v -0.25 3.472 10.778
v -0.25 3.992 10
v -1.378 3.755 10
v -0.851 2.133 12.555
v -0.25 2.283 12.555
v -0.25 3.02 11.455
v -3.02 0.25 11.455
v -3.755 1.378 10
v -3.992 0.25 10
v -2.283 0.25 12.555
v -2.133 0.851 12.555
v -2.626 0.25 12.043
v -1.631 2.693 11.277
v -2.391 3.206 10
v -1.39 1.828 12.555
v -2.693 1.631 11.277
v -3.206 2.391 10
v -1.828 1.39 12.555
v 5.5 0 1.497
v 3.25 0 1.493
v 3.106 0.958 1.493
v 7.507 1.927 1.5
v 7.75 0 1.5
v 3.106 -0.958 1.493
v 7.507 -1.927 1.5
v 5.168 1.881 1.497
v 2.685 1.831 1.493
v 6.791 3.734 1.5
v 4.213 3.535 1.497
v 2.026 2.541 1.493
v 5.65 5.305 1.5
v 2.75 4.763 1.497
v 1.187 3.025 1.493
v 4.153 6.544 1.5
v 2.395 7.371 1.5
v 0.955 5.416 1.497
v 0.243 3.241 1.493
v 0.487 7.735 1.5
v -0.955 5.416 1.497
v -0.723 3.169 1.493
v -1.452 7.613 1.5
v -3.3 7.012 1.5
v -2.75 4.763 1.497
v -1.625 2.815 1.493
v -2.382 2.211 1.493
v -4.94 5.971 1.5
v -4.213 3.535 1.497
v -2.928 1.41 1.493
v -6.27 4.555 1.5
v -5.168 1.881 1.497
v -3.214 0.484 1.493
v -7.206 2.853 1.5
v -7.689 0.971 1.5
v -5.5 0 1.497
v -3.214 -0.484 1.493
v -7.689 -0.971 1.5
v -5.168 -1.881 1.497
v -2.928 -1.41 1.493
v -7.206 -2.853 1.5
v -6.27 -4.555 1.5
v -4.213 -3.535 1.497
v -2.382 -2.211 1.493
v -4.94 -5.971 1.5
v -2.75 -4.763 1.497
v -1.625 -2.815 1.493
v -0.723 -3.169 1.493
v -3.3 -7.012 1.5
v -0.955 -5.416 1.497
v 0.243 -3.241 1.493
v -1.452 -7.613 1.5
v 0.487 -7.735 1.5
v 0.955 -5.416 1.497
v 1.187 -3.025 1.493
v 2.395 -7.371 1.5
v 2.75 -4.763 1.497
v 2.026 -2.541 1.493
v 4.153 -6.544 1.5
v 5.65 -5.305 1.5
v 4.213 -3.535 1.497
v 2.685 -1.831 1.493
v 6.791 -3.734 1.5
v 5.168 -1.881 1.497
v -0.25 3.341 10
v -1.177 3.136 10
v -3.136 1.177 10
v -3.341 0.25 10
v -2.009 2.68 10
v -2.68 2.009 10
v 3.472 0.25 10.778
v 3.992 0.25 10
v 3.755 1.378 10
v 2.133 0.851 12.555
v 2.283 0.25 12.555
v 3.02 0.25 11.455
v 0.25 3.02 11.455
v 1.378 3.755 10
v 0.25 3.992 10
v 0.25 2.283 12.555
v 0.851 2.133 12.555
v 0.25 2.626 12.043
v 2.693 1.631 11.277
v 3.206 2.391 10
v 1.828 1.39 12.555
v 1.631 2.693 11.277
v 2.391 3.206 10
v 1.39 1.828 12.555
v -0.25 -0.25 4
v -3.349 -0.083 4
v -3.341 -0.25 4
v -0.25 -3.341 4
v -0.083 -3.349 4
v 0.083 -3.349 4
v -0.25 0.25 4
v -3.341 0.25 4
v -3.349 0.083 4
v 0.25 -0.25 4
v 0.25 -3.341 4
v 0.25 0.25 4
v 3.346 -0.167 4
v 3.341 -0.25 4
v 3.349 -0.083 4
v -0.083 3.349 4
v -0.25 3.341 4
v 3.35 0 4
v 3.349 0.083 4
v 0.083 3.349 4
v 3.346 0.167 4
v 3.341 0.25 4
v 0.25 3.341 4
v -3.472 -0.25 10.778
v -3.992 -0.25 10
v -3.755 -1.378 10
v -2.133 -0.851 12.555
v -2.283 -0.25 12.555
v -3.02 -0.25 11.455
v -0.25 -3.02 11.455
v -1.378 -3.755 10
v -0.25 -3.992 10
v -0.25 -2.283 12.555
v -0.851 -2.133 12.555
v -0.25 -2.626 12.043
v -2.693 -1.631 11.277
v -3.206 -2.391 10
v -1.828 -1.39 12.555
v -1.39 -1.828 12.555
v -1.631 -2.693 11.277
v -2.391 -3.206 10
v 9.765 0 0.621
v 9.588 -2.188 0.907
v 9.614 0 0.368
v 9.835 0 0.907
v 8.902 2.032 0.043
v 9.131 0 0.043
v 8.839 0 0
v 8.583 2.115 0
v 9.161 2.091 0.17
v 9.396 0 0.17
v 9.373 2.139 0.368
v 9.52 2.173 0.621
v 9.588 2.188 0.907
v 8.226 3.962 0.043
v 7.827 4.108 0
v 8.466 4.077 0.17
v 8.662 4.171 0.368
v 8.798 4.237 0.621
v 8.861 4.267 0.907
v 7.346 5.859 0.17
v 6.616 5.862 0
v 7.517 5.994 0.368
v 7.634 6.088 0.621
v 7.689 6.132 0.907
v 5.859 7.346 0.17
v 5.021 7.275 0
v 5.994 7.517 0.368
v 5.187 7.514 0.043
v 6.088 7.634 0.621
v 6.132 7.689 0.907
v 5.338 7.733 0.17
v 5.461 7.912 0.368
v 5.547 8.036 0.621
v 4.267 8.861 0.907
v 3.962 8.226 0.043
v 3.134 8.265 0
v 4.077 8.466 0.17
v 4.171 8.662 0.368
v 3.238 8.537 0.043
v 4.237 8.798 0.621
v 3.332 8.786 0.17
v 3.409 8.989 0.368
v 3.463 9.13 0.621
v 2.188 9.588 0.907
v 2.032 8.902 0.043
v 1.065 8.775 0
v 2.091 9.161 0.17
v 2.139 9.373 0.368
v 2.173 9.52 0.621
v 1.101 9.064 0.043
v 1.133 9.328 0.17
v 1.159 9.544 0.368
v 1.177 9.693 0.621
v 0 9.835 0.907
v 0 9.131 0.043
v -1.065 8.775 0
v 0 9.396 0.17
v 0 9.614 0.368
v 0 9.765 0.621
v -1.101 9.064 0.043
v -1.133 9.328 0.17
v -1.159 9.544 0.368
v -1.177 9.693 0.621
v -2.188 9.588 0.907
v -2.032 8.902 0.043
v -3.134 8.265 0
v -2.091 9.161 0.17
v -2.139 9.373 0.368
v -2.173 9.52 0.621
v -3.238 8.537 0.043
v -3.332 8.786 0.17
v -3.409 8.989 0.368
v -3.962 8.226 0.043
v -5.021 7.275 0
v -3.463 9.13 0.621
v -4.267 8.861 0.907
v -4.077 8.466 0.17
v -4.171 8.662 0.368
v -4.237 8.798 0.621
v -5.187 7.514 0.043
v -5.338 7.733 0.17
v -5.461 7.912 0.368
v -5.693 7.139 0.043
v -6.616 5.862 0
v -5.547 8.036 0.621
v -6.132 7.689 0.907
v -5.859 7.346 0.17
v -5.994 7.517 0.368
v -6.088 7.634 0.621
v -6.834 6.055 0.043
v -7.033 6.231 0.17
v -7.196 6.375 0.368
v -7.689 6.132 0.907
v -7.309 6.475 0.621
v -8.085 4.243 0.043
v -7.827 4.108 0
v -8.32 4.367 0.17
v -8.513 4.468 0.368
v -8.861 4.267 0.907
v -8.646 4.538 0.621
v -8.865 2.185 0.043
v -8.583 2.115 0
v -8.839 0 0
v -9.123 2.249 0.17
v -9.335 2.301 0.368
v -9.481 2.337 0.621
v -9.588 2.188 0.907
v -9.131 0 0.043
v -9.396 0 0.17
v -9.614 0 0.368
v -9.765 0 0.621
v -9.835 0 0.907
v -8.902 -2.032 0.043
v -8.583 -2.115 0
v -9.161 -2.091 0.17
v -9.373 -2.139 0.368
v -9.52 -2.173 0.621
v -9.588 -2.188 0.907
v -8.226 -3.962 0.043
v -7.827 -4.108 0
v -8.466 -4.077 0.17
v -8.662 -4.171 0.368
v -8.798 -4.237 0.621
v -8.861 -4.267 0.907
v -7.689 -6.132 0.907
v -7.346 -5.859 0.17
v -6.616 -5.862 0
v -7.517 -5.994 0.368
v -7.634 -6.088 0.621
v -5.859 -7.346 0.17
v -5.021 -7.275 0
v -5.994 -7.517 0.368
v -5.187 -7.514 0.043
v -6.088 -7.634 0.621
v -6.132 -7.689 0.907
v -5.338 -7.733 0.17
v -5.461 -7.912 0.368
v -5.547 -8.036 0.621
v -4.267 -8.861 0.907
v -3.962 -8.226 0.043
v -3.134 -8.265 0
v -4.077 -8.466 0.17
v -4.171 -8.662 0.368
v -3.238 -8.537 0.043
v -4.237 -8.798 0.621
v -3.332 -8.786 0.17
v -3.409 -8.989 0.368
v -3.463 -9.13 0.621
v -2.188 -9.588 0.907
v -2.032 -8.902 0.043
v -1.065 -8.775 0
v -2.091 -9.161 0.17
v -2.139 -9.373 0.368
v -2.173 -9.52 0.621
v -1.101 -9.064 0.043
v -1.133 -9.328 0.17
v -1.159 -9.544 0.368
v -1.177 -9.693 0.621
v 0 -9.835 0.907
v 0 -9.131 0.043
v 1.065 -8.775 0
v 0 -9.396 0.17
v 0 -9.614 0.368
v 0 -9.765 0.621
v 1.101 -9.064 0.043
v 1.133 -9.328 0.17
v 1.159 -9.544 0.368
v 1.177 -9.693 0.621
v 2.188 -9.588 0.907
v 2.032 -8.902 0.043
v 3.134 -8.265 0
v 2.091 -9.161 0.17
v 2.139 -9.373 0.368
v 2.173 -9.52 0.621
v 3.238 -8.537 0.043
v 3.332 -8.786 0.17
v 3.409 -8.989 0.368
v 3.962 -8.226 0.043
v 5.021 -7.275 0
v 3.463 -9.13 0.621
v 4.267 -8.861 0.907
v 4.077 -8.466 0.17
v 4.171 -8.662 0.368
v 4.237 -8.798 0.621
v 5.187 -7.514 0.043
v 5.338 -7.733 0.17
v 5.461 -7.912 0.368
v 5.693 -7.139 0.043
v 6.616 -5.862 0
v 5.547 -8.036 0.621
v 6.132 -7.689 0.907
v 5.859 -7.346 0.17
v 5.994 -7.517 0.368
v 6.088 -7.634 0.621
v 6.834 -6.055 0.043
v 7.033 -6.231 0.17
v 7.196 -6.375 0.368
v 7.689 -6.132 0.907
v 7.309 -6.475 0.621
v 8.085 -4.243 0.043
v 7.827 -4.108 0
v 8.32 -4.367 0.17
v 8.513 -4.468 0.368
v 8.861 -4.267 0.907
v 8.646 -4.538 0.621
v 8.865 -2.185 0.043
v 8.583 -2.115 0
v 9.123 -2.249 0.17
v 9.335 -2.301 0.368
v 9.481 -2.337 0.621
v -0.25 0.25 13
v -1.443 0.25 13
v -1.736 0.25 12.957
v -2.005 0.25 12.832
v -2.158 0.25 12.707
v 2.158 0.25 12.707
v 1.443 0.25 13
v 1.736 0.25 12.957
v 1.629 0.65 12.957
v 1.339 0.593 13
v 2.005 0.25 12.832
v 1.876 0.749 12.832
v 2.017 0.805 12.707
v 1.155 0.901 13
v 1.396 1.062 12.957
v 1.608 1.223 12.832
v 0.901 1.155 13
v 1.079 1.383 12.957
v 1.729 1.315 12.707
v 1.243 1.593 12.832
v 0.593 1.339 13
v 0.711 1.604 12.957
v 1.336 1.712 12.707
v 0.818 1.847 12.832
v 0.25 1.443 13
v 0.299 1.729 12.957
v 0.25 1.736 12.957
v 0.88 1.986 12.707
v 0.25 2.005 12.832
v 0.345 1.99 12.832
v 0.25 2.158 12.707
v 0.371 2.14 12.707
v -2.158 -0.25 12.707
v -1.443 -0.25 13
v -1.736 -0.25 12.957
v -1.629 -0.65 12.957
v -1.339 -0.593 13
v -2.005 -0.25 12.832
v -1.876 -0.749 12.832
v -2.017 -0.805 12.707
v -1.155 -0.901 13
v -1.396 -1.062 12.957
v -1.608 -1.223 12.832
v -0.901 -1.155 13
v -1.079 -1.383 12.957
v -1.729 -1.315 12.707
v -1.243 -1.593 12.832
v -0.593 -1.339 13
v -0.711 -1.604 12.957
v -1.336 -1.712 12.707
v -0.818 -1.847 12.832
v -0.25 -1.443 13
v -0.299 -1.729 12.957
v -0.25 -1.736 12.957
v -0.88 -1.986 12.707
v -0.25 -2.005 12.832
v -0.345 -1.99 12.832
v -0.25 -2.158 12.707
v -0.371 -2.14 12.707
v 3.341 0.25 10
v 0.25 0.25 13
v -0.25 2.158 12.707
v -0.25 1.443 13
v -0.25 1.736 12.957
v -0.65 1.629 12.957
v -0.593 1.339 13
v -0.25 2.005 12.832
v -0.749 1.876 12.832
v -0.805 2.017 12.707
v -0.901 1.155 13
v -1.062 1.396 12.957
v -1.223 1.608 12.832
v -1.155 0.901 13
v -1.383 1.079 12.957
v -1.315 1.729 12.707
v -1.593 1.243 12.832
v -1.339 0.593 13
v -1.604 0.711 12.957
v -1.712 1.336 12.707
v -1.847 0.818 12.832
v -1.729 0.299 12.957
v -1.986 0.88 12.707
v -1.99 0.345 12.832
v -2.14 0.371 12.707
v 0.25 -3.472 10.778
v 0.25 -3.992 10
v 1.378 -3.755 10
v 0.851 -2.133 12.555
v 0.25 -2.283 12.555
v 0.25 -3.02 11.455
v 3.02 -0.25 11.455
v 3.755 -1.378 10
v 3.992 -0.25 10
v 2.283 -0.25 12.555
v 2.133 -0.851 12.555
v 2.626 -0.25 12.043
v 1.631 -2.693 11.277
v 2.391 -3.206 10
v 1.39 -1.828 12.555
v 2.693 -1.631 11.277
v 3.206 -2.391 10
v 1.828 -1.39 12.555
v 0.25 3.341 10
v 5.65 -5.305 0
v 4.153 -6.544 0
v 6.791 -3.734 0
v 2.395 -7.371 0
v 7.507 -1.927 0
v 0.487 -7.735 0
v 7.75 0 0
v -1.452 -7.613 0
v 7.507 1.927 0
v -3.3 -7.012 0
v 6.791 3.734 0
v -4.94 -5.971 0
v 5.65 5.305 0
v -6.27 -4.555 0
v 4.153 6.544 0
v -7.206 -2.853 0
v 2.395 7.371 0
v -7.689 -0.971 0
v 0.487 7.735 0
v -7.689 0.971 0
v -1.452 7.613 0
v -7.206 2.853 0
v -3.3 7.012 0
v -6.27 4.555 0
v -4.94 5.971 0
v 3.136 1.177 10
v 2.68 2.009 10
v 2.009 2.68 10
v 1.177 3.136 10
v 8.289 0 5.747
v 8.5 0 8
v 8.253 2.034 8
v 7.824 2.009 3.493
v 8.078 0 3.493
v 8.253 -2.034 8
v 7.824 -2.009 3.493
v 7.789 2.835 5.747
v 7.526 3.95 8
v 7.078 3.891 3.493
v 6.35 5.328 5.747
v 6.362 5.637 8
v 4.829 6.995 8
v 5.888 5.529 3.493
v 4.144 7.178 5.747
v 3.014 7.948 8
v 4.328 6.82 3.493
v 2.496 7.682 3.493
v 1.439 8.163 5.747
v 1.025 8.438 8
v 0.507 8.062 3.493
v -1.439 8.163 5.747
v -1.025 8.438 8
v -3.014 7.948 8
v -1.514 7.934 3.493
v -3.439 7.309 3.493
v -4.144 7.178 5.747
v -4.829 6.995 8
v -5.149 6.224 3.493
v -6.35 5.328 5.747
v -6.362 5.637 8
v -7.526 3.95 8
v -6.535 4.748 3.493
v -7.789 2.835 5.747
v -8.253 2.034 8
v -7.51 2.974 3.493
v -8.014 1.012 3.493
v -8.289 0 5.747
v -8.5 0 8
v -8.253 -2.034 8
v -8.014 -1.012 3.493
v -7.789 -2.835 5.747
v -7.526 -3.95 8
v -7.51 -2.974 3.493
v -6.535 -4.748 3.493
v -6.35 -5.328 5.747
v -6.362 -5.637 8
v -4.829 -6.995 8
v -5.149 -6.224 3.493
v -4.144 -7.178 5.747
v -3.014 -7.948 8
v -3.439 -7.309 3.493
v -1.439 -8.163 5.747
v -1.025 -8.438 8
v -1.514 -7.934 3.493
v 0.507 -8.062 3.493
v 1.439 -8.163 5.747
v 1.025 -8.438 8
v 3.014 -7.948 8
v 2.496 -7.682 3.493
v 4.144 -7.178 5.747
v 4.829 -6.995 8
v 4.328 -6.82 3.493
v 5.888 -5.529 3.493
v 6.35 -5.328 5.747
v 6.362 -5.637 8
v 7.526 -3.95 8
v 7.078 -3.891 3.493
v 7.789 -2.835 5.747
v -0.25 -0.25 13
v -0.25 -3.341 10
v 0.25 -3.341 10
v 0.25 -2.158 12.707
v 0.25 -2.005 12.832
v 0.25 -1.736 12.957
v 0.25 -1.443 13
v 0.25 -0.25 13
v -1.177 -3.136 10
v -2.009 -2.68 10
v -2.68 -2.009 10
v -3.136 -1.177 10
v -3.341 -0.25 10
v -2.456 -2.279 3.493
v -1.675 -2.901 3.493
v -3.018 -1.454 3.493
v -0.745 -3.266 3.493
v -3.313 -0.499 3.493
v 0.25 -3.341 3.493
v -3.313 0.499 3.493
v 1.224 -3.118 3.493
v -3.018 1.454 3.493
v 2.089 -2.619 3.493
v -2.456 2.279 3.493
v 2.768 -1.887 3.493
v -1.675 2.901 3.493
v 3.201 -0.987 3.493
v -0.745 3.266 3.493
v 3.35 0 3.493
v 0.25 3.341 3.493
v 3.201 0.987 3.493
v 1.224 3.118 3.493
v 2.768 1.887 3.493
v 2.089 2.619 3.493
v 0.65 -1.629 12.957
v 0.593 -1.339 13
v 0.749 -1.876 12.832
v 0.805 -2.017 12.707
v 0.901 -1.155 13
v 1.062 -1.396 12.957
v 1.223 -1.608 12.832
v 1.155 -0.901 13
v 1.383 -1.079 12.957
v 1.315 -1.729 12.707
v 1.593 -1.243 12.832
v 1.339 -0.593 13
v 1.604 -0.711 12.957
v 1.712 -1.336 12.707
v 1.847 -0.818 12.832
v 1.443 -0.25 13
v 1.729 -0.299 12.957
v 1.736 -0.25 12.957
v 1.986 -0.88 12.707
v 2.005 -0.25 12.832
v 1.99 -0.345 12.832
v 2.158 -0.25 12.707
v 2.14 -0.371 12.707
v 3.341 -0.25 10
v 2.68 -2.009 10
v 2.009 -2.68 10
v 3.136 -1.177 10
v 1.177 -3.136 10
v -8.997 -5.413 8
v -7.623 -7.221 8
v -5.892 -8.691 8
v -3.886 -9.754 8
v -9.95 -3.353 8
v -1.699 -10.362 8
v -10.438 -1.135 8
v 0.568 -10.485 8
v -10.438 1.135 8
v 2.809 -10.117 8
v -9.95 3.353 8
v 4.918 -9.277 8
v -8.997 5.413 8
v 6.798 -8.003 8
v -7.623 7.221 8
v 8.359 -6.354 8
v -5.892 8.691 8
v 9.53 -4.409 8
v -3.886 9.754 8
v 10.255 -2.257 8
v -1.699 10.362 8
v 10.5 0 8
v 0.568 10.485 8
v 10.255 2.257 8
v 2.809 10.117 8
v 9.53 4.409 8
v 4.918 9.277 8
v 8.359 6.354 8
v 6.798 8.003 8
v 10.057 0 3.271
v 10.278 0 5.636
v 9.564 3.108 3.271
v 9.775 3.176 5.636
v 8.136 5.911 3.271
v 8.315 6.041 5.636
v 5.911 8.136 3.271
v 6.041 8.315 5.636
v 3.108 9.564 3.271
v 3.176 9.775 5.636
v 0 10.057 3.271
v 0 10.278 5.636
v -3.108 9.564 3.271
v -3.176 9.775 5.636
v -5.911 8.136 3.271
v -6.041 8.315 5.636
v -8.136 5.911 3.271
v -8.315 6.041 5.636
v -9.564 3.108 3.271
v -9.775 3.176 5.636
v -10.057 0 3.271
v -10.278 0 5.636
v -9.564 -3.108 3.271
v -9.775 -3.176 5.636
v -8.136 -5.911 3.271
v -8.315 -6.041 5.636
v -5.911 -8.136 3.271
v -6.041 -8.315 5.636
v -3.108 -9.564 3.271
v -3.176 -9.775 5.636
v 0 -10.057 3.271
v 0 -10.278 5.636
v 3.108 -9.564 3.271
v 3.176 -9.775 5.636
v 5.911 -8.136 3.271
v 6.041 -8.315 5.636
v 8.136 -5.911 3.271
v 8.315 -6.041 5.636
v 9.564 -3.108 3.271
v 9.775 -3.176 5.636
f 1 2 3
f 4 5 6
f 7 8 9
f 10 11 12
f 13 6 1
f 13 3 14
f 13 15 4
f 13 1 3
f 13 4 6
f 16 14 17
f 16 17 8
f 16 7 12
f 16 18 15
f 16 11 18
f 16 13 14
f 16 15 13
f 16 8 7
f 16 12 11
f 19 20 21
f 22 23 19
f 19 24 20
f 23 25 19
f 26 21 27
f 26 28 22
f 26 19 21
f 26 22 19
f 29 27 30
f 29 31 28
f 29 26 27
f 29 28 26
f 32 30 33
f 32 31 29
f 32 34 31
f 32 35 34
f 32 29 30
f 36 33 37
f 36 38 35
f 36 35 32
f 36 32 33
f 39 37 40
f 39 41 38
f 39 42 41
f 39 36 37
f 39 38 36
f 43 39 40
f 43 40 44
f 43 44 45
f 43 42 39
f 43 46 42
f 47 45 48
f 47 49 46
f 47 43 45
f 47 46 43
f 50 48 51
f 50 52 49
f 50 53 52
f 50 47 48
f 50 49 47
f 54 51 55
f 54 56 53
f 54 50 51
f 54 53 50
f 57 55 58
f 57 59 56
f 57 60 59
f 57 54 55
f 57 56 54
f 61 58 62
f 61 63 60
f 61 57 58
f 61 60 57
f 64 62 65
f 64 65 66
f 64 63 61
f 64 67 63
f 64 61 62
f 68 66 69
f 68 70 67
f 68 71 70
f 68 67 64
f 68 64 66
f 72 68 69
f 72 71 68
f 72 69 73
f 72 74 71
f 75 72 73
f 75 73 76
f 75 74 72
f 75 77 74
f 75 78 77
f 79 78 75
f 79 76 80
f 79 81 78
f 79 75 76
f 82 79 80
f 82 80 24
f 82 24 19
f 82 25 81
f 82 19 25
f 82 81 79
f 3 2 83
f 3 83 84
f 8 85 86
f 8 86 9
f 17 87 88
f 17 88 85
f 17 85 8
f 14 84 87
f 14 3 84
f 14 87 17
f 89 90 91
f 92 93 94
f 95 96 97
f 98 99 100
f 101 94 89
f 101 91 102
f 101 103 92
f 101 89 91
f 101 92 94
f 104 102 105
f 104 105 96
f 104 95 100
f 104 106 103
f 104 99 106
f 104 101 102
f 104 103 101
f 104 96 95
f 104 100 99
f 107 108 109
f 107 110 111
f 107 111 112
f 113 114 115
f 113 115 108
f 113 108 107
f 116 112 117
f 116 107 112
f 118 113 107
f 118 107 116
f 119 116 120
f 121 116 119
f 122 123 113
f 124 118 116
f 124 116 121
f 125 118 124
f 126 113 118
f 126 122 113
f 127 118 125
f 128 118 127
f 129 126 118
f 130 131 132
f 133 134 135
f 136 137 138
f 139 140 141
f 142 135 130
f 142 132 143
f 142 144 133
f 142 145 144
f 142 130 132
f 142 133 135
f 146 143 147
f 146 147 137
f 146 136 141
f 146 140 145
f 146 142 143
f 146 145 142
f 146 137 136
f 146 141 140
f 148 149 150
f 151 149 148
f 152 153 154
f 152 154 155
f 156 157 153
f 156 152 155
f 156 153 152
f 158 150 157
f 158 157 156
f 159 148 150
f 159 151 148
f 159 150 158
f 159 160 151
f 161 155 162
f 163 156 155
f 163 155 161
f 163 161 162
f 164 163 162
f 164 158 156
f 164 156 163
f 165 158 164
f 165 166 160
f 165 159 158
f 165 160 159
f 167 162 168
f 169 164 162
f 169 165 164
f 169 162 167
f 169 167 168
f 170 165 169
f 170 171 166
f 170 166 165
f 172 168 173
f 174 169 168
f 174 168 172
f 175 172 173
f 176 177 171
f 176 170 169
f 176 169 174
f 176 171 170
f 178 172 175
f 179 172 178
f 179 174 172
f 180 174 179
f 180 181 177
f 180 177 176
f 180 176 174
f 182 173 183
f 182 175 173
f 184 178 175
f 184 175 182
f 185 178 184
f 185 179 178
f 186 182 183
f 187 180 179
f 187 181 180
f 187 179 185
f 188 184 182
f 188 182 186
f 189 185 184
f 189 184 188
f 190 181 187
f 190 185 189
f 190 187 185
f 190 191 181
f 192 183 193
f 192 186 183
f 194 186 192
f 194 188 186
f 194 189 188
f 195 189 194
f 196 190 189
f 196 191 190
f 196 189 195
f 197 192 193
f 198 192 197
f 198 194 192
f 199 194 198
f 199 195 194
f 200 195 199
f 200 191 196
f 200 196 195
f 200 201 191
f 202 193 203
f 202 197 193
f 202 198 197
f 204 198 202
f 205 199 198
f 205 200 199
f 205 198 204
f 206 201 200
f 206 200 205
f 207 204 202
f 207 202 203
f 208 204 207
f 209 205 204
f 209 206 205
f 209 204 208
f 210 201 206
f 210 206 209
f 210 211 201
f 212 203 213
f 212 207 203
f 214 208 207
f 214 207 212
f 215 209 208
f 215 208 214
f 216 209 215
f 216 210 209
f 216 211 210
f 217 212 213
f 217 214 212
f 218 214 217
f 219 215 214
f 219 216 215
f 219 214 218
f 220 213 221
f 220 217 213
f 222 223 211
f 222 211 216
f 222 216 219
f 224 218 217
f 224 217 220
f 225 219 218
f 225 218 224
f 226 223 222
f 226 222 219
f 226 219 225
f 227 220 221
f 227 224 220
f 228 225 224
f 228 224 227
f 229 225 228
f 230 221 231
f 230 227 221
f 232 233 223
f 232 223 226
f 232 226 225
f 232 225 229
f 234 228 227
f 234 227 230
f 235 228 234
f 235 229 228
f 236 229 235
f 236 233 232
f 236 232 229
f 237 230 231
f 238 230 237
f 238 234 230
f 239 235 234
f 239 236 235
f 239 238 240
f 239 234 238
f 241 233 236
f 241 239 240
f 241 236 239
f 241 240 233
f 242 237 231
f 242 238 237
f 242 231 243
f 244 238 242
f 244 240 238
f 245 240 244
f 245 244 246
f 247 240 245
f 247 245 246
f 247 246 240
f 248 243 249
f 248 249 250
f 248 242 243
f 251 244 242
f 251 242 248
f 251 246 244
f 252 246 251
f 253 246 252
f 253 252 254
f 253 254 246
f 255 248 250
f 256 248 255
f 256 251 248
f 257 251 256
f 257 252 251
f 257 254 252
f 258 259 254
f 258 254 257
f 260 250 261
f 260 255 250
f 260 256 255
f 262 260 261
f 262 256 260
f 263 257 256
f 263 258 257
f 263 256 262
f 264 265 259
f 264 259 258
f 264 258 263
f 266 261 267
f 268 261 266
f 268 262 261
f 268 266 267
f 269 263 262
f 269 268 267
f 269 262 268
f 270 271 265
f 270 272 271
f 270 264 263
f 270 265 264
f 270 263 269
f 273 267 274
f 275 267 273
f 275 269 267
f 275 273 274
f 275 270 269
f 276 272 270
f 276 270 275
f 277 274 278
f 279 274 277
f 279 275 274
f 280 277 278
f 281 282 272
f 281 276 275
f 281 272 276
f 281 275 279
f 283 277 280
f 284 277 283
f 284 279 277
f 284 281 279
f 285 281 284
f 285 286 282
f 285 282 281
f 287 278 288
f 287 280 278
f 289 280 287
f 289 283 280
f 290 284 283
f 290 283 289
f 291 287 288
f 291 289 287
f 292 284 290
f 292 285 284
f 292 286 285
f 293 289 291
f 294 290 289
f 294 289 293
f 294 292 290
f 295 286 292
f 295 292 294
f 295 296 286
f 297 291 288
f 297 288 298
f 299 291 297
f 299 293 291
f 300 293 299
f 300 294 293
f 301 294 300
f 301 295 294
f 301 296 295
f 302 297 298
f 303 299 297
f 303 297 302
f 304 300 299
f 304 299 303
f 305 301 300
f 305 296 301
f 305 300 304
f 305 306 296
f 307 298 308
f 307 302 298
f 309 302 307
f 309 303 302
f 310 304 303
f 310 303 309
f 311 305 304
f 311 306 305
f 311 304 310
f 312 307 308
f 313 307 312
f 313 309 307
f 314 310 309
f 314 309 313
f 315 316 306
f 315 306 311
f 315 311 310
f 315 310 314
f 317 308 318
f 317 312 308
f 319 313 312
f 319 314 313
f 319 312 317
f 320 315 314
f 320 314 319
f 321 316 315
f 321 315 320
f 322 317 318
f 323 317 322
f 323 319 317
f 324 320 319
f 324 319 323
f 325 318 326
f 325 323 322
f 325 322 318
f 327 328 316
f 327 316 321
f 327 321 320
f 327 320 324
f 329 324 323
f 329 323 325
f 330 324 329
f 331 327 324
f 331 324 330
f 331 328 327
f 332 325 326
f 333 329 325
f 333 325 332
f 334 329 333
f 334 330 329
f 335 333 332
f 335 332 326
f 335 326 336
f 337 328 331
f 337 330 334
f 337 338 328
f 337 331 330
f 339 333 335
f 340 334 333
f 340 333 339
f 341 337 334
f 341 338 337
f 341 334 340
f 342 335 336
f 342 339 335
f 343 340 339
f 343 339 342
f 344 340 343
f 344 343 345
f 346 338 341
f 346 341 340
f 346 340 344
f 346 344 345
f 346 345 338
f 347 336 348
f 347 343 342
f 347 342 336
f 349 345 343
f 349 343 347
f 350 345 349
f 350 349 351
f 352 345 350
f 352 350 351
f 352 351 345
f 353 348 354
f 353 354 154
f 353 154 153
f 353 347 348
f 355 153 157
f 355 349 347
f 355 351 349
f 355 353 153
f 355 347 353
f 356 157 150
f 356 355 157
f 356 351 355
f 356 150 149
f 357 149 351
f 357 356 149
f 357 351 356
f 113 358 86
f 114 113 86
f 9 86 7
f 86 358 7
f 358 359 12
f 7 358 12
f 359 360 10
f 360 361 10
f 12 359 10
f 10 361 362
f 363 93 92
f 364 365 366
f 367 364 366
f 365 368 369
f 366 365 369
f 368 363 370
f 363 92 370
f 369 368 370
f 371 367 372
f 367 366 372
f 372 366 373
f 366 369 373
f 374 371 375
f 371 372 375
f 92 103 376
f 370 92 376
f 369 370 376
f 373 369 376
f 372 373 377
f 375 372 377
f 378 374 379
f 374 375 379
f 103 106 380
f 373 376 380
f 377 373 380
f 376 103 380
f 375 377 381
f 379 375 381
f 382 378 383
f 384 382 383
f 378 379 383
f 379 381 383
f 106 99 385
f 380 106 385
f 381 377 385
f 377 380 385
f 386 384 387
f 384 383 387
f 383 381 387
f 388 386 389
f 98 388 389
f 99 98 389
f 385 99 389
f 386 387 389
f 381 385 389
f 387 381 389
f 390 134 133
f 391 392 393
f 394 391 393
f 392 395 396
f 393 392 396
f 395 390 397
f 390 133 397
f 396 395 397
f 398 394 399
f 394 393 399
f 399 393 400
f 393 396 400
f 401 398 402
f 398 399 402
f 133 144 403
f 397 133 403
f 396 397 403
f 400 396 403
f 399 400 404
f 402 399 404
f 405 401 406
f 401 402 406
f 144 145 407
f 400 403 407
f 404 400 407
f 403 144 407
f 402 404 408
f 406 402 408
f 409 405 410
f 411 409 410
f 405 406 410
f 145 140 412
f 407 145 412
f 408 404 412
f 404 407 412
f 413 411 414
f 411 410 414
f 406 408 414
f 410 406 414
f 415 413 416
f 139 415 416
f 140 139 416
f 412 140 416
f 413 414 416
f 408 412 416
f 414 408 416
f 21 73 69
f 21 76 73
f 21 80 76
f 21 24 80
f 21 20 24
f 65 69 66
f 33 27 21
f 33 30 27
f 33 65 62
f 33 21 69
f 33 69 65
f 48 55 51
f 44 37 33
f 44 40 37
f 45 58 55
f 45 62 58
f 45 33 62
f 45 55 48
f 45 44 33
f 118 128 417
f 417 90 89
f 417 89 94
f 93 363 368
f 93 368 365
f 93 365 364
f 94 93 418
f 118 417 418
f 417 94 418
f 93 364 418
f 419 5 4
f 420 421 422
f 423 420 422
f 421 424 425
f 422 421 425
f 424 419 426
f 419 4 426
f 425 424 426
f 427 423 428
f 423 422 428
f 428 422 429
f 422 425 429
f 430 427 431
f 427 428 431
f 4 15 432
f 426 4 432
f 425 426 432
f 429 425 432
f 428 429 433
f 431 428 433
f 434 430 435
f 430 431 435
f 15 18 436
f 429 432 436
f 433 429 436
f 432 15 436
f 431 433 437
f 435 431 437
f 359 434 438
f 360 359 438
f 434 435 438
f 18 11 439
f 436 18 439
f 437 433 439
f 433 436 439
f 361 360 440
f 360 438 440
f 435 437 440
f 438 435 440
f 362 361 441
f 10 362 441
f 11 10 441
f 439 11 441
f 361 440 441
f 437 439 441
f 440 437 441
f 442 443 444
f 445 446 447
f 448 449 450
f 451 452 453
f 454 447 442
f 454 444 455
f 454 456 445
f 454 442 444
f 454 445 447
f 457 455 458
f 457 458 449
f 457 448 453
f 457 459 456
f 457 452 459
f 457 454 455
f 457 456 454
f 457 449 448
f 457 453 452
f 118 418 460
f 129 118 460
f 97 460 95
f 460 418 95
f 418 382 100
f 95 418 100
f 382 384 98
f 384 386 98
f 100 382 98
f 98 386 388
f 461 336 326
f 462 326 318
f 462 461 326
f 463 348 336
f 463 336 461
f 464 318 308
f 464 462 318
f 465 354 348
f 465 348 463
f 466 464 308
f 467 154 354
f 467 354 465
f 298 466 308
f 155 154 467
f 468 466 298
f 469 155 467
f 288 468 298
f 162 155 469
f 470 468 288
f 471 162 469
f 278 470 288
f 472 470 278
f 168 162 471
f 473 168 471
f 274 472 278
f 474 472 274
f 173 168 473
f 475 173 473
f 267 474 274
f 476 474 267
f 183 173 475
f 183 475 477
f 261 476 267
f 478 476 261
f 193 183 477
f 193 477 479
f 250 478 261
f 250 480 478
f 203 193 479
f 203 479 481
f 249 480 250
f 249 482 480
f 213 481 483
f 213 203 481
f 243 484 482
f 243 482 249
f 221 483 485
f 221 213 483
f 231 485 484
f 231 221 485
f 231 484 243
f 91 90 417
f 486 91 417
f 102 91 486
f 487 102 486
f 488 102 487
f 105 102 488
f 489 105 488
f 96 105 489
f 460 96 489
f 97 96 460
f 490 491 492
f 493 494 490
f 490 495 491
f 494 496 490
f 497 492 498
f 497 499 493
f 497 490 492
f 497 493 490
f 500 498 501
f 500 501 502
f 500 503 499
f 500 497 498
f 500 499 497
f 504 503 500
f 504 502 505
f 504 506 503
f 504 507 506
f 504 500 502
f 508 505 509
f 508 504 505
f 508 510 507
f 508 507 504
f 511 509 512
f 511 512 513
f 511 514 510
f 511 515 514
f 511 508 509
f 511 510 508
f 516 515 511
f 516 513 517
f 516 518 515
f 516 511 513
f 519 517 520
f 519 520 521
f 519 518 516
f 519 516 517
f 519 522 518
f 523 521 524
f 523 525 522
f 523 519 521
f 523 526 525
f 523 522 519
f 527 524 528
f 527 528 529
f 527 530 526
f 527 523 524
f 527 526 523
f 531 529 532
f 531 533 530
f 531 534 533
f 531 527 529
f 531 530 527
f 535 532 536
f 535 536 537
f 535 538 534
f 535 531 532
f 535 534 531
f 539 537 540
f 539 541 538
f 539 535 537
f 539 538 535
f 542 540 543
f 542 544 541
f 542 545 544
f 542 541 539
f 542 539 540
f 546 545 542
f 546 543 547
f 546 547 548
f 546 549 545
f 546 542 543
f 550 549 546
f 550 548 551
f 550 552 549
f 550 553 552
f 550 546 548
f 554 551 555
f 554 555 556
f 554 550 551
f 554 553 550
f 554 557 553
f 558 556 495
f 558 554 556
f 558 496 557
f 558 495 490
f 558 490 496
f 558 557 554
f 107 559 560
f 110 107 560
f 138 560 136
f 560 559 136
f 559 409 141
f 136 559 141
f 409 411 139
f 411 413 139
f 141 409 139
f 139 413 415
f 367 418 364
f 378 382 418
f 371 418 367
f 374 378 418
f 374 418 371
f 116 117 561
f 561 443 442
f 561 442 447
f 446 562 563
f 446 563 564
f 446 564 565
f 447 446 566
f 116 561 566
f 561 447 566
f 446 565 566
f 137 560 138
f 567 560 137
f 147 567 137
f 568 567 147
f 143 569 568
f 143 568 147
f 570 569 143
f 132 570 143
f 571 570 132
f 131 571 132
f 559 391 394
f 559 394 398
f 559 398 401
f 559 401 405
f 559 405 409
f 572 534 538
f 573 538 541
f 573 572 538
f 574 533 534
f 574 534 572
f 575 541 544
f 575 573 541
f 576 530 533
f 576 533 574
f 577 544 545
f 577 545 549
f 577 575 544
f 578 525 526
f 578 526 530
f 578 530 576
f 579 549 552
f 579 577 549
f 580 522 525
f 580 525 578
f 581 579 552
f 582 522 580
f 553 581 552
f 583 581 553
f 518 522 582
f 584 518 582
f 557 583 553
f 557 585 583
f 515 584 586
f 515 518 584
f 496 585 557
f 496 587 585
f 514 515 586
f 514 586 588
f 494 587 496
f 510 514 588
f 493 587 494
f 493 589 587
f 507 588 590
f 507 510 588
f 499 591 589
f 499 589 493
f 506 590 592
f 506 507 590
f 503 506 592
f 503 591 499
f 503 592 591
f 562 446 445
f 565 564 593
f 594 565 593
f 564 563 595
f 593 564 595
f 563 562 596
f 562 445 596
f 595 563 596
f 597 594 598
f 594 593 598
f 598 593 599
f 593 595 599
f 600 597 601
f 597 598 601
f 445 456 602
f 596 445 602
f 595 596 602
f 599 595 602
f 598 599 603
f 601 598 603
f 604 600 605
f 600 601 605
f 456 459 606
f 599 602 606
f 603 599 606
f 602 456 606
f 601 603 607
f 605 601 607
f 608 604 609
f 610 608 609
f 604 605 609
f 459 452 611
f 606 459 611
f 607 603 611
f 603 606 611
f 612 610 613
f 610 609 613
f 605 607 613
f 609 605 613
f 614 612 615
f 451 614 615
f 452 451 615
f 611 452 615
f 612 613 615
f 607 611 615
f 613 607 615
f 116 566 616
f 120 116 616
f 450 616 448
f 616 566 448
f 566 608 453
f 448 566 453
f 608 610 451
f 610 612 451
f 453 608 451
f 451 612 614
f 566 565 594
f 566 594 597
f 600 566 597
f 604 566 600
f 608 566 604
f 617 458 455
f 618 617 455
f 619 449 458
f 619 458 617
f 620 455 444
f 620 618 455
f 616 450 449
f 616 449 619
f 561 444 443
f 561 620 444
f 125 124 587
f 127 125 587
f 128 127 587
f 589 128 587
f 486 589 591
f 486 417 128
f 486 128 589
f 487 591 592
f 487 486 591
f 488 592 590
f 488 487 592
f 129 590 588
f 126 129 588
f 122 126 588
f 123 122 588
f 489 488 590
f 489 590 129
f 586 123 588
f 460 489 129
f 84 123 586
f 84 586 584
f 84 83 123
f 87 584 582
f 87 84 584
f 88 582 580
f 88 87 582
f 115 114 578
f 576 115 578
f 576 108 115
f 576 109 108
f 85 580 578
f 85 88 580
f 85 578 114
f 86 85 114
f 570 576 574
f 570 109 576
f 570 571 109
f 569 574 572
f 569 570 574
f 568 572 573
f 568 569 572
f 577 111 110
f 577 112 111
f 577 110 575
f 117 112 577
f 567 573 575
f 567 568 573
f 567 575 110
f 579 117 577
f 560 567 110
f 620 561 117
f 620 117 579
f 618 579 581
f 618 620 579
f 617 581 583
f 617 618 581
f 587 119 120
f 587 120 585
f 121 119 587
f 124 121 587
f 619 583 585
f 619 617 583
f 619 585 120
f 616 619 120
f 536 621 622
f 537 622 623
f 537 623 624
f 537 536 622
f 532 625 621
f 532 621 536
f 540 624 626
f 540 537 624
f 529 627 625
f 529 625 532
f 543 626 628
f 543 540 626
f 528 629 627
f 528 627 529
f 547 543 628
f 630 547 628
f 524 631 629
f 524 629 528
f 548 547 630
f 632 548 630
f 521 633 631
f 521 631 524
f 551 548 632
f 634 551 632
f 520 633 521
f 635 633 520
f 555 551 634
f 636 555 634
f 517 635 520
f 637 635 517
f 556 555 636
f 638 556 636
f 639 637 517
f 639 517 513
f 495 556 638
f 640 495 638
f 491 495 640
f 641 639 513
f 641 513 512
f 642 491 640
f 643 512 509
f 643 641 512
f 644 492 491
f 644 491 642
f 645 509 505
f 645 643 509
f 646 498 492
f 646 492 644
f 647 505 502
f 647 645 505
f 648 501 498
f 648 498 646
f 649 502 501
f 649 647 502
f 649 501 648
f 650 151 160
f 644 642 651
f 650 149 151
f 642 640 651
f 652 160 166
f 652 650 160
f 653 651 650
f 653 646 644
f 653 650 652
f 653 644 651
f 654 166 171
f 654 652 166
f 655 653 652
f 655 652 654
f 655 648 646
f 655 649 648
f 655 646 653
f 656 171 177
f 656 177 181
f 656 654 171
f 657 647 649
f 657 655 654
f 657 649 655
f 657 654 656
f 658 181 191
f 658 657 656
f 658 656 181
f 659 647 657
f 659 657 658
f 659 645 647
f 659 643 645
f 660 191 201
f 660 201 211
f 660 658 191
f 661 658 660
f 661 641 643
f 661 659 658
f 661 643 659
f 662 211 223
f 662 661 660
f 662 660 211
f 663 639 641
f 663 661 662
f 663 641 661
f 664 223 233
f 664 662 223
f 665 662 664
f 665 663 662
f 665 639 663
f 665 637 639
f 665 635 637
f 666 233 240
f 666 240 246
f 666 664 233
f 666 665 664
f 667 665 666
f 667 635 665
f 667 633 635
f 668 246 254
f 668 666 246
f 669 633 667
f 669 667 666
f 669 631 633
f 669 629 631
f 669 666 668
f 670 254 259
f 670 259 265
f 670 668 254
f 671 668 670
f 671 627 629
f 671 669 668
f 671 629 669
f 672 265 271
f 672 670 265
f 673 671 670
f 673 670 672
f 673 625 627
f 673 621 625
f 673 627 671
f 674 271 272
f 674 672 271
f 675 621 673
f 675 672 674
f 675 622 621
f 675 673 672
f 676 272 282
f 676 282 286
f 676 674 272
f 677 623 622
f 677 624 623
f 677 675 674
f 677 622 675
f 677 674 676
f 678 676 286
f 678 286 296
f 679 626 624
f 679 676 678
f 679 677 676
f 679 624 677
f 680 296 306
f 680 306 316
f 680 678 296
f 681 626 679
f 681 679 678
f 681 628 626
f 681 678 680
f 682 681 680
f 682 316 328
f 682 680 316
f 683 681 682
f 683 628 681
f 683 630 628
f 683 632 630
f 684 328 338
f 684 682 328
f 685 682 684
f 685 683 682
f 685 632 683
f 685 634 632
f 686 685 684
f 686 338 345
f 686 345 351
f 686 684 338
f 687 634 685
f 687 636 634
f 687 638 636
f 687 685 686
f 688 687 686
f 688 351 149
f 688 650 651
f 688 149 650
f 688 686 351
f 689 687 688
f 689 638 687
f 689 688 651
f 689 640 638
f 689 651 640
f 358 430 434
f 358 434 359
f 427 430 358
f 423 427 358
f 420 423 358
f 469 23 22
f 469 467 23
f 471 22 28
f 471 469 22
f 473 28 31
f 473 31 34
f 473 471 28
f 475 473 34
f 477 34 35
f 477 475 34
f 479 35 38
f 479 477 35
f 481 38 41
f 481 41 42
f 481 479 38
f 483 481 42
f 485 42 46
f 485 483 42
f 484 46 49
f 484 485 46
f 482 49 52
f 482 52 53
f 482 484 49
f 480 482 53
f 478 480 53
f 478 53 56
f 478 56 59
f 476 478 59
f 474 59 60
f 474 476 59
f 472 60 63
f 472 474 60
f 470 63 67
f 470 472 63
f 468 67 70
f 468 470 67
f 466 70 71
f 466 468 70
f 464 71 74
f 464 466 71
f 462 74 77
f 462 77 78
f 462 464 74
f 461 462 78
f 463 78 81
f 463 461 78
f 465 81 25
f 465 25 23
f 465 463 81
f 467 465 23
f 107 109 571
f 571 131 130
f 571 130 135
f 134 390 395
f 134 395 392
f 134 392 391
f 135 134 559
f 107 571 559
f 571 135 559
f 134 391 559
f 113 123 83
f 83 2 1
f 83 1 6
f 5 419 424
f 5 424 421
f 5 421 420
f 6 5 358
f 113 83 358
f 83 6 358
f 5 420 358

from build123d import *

# Parameters (mm, degrees)
F2_W     = 0.5
F2_H     = 0.5
F3_DEPTH = 9
F4_R     = 1
F5_R     = 1


with BuildPart() as f1:
    # F0 (on Front) → F1 (revolve)
    with BuildSketch(Plane.XZ):
        Polygon((7.75, 0), (9.75, 0), (10.5, 8), (8.5, 8), (8.0775014419, 3.4933487132), (3.35, 3.4933487132), (3.35, 10), (4, 10), (2, 13), (0, 13), (0, 8), (0, 1.4933487132), (3.25, 1.4933487132), (7.75, 1.5), align=None)
    revolve(axis=Axis((0, 0, 4), (0, 0, 1)))

    # F2 (on face) → F3 (cut)
    with BuildSketch(Plane.XY.offset(13)):
        with BuildLine():
            ThreePointArc((-1.9843134833, -0.25), (-2, 0), (-1.9843134833, 0.25))
            Line((-1.9843134833, 0.25), (-4, 0.25))
            Line((-4, 0.25), (-4, -0.25))
            Line((-4, -0.25), (-1.9843134833, -0.25))
        make_face()
        with BuildLine():
            Line((-0.25, -0.25), (-0.25, 0.25))
            Line((-0.25, 0.25), (-1.9843134833, 0.25))
            ThreePointArc((-1.9843134833, 0.25), (-2, 0), (-1.9843134833, -0.25))
            Line((-1.9843134833, -0.25), (-0.25, -0.25))
        make_face()
        Rectangle(F2_W, F2_H)
        with BuildLine():
            Line((1.9843134833, 0.25), (0.25, 0.25))
            Line((0.25, 0.25), (0.25, -0.25))
            Line((0.25, -0.25), (1.9843134833, -0.25))
            ThreePointArc((1.9843134833, -0.25), (1.9960745185, -0.1252458251), (2, 0))
            ThreePointArc((2, 0), (1.9960745185, 0.1252458251), (1.9843134833, 0.25))
        make_face()
        with BuildLine():
            Line((4, 0.25), (1.9843134833, 0.25))
            ThreePointArc((1.9843134833, 0.25), (1.9960745185, 0.1252458251), (2, 0))
            ThreePointArc((2, 0), (1.9960745185, -0.1252458251), (1.9843134833, -0.25))
            Line((1.9843134833, -0.25), (4, -0.25))
            Line((4, -0.25), (4, 0.25))
        make_face()
        with BuildLine():
            Line((0.25, 1.9843134833), (0.25, 4))
            Line((0.25, 4), (-0.25, 4))
            Line((-0.25, 4), (-0.25, 1.9843134833))
            ThreePointArc((-0.25, 1.9843134833), (0, 2), (0.25, 1.9843134833))
        make_face()
        with BuildLine():
            Line((0.25, 0.25), (0.25, 1.9843134833))
            ThreePointArc((0.25, 1.9843134833), (0, 2), (-0.25, 1.9843134833))
            Line((-0.25, 1.9843134833), (-0.25, 0.25))
            Line((-0.25, 0.25), (0.25, 0.25))
        make_face()
        with BuildLine():
            Line((0.25, -1.9843134833), (0.25, -0.25))
            Line((0.25, -0.25), (-0.25, -0.25))
            Line((-0.25, -0.25), (-0.25, -1.9843134833))
            ThreePointArc((-0.25, -1.9843134833), (0, -2), (0.25, -1.9843134833))
        make_face()
        with BuildLine():
            Line((0.25, -4), (0.25, -1.9843134833))
            ThreePointArc((0.25, -1.9843134833), (0, -2), (-0.25, -1.9843134833))
            Line((-0.25, -1.9843134833), (-0.25, -4))
            Line((-0.25, -4), (0.25, -4))
        make_face()
    extrude(amount=-F3_DEPTH, mode=Mode.SUBTRACT)

    # F4
    f4_edges = [f1.edges().sort_by_distance(p)[0] for p in [
        (-9.75, 0, 0),
    ]]
    fillet(f4_edges, radius=F4_R)

    # F5
    f5_edges = [f1.edges().sort_by_distance(p)[0] for p in [
        (-1.414214, -1.414214, 13),
        (1.414214, -1.414214, 13),
        (1.414214, 1.414214, 13),
        (-1.414214, 1.414214, 13),
    ]]
    fillet(f5_edges, radius=F5_R)


solid = f1.part
